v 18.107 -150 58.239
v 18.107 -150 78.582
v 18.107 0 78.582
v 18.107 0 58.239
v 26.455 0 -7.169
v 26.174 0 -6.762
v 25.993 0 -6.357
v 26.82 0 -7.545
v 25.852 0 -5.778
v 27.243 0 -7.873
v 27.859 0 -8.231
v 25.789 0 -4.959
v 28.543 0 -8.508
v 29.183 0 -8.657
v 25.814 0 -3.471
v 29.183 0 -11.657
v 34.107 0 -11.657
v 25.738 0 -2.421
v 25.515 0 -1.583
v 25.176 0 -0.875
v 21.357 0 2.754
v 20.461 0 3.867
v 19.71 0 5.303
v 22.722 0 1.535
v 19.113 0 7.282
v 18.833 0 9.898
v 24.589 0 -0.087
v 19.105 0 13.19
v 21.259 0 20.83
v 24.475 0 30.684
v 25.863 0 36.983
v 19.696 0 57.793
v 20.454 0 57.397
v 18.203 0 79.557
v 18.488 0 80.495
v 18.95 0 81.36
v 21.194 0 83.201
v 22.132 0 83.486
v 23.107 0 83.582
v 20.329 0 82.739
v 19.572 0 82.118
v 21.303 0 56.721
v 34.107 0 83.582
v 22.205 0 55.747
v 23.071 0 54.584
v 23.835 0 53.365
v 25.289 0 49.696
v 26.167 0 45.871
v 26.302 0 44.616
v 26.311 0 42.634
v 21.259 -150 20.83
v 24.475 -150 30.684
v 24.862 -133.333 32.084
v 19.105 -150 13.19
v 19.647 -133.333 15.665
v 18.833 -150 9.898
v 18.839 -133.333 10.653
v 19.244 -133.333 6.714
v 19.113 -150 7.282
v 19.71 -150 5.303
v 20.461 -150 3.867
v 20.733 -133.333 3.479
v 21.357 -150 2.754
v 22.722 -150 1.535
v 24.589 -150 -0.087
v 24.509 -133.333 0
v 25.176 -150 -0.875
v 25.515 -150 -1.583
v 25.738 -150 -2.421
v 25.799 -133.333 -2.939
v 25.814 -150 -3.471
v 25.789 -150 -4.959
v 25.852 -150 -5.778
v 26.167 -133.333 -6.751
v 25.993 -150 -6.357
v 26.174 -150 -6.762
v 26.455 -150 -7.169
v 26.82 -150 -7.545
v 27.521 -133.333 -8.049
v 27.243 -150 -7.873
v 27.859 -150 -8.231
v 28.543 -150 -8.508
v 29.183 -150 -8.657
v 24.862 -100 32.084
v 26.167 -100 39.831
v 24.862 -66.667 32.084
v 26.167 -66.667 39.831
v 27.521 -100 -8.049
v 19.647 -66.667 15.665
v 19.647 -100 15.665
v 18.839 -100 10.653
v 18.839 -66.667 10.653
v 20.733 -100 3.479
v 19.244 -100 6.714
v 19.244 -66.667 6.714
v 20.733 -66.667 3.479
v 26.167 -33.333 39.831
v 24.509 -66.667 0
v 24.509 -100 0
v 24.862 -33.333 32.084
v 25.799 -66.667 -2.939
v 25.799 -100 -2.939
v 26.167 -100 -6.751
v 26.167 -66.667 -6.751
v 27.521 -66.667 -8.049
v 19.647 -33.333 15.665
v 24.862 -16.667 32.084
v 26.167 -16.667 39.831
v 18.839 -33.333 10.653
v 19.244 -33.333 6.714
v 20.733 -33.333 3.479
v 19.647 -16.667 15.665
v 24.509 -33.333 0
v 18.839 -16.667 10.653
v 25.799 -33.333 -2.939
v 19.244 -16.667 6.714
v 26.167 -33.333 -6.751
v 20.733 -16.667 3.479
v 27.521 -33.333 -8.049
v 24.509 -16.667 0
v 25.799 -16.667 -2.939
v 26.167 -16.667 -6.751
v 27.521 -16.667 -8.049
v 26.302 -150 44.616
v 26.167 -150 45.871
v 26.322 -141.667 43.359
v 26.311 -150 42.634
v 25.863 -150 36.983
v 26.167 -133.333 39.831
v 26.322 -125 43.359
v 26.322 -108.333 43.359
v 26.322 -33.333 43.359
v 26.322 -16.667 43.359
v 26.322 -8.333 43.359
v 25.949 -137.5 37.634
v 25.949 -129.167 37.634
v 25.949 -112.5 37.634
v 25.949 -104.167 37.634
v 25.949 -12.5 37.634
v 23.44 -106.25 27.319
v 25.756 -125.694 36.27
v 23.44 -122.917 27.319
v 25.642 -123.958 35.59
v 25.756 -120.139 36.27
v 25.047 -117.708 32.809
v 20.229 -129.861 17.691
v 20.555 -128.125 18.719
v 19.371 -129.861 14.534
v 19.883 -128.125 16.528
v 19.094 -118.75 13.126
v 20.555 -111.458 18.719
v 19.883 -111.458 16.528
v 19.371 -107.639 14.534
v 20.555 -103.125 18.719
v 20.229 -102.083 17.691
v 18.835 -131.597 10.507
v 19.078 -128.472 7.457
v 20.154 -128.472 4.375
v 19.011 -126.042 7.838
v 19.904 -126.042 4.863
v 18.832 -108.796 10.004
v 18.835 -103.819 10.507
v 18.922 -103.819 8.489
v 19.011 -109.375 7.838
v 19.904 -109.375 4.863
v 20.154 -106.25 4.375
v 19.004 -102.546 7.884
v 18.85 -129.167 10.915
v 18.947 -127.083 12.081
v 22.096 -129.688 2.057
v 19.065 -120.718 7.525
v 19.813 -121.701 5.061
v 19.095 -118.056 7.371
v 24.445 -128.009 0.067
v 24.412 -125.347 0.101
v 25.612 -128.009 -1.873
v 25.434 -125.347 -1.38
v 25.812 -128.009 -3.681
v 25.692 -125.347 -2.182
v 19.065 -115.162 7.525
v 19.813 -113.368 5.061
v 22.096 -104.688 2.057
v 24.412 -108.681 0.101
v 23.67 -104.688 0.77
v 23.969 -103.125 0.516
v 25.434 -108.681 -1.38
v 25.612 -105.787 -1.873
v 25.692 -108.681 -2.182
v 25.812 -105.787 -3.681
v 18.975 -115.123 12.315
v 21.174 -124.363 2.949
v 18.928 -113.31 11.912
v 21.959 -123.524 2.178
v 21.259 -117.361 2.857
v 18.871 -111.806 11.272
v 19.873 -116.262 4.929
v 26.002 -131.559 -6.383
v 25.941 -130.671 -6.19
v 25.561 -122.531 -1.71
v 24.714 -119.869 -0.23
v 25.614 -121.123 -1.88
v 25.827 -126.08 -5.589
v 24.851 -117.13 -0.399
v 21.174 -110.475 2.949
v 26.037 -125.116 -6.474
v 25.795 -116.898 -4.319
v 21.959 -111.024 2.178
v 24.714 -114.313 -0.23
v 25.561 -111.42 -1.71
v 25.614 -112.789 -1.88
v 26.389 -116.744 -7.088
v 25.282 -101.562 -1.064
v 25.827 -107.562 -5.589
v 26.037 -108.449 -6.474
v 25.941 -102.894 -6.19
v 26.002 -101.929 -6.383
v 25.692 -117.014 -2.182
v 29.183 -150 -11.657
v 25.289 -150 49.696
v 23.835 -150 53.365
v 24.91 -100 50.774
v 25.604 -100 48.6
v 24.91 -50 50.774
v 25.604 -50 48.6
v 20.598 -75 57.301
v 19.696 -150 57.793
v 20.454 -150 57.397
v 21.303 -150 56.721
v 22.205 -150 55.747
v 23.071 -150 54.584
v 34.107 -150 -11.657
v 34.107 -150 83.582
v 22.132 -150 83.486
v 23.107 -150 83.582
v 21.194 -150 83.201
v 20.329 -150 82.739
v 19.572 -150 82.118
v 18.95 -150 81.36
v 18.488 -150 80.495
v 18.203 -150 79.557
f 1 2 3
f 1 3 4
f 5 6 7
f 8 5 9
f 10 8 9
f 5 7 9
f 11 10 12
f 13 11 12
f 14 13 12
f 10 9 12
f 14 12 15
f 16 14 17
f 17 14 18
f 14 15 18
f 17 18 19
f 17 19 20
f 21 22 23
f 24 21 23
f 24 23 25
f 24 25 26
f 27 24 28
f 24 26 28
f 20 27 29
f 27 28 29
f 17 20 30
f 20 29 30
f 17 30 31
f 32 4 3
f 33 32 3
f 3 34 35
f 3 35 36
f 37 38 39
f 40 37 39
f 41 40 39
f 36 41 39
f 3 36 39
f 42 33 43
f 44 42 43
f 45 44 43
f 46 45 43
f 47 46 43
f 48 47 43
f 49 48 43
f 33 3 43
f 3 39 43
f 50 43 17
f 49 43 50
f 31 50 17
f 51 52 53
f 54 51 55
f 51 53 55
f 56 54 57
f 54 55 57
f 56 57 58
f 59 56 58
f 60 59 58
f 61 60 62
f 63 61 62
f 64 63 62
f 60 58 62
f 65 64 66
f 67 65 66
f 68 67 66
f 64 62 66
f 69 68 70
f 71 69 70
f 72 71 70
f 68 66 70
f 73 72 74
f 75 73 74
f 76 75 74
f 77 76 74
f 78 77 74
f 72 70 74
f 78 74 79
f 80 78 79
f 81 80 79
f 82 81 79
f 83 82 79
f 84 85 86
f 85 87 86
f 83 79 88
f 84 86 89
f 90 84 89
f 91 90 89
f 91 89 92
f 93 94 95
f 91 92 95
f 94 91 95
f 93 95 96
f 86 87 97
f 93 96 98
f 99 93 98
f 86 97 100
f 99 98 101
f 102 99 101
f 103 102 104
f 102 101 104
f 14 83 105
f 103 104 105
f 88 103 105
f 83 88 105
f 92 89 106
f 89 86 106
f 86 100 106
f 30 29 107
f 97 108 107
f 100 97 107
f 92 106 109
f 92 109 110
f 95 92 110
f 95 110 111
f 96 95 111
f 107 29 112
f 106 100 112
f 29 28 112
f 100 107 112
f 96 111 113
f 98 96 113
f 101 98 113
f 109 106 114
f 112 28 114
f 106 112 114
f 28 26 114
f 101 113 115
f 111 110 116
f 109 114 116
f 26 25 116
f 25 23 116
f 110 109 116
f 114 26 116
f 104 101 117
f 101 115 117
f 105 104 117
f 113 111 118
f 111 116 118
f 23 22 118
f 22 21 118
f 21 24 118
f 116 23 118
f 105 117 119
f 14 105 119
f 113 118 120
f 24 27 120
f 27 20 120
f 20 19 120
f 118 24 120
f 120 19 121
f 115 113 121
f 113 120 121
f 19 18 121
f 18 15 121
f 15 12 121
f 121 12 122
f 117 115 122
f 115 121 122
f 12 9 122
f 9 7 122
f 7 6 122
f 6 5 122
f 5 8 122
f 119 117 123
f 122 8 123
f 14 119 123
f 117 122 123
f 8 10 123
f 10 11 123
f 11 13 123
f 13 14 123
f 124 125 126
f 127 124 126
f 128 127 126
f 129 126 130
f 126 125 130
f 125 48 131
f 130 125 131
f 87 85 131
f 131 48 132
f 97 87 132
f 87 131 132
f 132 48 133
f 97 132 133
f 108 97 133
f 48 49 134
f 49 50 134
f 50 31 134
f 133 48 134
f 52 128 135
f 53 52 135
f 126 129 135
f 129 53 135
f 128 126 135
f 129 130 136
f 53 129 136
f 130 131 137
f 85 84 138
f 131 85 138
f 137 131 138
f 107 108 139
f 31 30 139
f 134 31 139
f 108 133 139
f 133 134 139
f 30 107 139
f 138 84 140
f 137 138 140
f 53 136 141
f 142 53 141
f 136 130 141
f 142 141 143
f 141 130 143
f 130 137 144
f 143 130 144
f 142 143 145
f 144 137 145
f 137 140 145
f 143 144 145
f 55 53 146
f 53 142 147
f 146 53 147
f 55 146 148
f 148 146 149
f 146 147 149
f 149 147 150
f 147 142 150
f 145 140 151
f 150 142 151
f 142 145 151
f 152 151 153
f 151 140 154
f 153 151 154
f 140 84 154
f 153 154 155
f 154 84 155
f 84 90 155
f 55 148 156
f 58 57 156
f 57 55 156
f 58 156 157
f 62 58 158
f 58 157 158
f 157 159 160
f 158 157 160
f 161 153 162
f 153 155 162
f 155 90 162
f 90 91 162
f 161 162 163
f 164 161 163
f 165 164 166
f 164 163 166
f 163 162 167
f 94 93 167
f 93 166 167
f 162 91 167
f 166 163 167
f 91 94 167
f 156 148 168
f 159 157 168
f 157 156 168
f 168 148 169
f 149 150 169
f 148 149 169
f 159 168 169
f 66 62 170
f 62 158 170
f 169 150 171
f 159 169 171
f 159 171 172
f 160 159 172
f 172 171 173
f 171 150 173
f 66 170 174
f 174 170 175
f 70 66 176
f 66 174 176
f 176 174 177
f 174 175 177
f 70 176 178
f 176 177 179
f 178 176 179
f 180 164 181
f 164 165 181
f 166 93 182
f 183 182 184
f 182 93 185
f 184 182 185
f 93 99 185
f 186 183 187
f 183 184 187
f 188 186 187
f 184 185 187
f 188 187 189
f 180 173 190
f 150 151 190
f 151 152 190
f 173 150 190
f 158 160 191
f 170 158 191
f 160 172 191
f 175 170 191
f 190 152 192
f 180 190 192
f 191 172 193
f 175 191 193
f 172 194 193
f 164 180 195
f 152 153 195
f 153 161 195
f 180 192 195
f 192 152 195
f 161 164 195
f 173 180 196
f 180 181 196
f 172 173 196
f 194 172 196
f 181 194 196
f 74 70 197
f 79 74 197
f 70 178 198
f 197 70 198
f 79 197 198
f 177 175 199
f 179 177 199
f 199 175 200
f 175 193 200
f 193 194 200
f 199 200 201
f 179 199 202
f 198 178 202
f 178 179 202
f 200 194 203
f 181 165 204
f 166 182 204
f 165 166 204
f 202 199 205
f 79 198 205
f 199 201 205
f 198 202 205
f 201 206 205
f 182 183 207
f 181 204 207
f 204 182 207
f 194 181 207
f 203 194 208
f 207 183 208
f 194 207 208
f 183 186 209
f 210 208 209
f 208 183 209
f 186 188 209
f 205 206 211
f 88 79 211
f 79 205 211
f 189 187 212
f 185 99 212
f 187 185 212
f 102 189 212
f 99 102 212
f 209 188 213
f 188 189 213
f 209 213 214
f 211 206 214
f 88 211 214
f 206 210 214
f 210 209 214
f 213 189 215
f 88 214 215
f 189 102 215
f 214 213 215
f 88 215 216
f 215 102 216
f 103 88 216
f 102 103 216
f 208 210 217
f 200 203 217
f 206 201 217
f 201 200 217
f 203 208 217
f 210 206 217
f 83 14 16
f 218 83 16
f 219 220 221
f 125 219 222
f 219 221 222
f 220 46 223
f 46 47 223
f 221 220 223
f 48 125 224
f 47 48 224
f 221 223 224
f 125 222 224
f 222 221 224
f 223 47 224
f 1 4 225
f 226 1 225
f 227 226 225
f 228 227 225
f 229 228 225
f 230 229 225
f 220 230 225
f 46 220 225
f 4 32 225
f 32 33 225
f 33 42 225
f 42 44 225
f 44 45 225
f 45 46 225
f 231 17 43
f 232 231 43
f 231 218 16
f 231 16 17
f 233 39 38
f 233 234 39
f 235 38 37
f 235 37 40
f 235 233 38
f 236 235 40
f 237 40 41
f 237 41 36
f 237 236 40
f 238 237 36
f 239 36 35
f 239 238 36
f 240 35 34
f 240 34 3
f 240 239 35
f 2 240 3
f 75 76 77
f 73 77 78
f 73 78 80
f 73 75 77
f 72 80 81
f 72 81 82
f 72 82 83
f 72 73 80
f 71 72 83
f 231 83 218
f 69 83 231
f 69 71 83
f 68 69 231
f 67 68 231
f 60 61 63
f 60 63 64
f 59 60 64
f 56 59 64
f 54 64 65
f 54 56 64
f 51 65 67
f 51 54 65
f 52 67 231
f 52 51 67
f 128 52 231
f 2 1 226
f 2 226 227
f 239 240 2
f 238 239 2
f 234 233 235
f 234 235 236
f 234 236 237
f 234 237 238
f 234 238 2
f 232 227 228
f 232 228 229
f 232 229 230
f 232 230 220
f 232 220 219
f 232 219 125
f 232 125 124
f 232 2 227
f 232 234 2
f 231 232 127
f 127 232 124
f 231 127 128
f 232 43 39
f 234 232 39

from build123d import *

# Parameters (mm, degrees)
F1_DEPTH = 150
F2_R     = 5


with BuildPart() as f1:
    # F0 (on Front) → F1 (new body)
    with BuildSketch(Plane.XZ):
        with BuildLine():
            Line((34.1070947651, -11.6565211154), (34.1070947651, 83.5819763541))
            Line((34.1070947651, 83.5819763541), (18.1070947651, 83.5819763541))
            Line((18.1070947651, 83.5819763541), (18.1070947651, 58.2385096952))
            add(Edge.make_bspline(
                [(18.1070947651, 58.2385096952), (18.9126885015, 58.0648723833), (20.9066399185, 57.6533927421), (22.9699261319, 54.8647603074), (23.8345864999, 53.365067498)],
                knots=[0, 0, 0, 0, 0.4194906876, 1, 1, 1, 1], degree=3))
            add(Edge.make_bspline(
                [(23.8345864999, 53.365067498), (25.184784915, 50.2428744032), (25.5859287593, 49.2007282356), (26.16743222, 45.8712734469)],
                knots=[0, 0, 0, 0, 7.8485105869, 7.8485105869, 7.8485105869, 7.8485105869], degree=3))
            add(Edge.make_bspline(
                [(26.16743222, 45.8712734469), (26.398906107, 44.8603835421), (26.2909467908, 39.1556882934), (25.1251682729, 32.0158799134), (21.2520767217, 20.9130118261), (18.0035620712, 11.0653072942), (19.8976758362, 3.0803796745), (24.7880165178, 0.3532833446), (26.1726626976, -2.8377032419), (25.2579878267, -7.0729338973), (28.1889608146, -8.5198188357), (29.1828027494, -8.6572972648)],
                knots=[0, 0, 0, 0, 0.1089398672, 0.2331773817, 0.3848807802, 0.5289478889, 0.6496881605, 0.750125742, 0.8295349848, 0.9162766416, 1, 1, 1, 1], degree=3))
            Line((29.1828027494, -8.6572972648), (29.1828027494, -11.6565211154))
            Line((29.1828027494, -11.6565211154), (34.1070947651, -11.6565211154))
        make_face()
    extrude(amount=F1_DEPTH)

    # F2
    f2_edges = [f1.edges().sort_by_distance(p)[0] for p in [
        (18.107095, -75, 83.581976),
    ]]
    fillet(f2_edges, radius=F2_R)


solid = f1.part
